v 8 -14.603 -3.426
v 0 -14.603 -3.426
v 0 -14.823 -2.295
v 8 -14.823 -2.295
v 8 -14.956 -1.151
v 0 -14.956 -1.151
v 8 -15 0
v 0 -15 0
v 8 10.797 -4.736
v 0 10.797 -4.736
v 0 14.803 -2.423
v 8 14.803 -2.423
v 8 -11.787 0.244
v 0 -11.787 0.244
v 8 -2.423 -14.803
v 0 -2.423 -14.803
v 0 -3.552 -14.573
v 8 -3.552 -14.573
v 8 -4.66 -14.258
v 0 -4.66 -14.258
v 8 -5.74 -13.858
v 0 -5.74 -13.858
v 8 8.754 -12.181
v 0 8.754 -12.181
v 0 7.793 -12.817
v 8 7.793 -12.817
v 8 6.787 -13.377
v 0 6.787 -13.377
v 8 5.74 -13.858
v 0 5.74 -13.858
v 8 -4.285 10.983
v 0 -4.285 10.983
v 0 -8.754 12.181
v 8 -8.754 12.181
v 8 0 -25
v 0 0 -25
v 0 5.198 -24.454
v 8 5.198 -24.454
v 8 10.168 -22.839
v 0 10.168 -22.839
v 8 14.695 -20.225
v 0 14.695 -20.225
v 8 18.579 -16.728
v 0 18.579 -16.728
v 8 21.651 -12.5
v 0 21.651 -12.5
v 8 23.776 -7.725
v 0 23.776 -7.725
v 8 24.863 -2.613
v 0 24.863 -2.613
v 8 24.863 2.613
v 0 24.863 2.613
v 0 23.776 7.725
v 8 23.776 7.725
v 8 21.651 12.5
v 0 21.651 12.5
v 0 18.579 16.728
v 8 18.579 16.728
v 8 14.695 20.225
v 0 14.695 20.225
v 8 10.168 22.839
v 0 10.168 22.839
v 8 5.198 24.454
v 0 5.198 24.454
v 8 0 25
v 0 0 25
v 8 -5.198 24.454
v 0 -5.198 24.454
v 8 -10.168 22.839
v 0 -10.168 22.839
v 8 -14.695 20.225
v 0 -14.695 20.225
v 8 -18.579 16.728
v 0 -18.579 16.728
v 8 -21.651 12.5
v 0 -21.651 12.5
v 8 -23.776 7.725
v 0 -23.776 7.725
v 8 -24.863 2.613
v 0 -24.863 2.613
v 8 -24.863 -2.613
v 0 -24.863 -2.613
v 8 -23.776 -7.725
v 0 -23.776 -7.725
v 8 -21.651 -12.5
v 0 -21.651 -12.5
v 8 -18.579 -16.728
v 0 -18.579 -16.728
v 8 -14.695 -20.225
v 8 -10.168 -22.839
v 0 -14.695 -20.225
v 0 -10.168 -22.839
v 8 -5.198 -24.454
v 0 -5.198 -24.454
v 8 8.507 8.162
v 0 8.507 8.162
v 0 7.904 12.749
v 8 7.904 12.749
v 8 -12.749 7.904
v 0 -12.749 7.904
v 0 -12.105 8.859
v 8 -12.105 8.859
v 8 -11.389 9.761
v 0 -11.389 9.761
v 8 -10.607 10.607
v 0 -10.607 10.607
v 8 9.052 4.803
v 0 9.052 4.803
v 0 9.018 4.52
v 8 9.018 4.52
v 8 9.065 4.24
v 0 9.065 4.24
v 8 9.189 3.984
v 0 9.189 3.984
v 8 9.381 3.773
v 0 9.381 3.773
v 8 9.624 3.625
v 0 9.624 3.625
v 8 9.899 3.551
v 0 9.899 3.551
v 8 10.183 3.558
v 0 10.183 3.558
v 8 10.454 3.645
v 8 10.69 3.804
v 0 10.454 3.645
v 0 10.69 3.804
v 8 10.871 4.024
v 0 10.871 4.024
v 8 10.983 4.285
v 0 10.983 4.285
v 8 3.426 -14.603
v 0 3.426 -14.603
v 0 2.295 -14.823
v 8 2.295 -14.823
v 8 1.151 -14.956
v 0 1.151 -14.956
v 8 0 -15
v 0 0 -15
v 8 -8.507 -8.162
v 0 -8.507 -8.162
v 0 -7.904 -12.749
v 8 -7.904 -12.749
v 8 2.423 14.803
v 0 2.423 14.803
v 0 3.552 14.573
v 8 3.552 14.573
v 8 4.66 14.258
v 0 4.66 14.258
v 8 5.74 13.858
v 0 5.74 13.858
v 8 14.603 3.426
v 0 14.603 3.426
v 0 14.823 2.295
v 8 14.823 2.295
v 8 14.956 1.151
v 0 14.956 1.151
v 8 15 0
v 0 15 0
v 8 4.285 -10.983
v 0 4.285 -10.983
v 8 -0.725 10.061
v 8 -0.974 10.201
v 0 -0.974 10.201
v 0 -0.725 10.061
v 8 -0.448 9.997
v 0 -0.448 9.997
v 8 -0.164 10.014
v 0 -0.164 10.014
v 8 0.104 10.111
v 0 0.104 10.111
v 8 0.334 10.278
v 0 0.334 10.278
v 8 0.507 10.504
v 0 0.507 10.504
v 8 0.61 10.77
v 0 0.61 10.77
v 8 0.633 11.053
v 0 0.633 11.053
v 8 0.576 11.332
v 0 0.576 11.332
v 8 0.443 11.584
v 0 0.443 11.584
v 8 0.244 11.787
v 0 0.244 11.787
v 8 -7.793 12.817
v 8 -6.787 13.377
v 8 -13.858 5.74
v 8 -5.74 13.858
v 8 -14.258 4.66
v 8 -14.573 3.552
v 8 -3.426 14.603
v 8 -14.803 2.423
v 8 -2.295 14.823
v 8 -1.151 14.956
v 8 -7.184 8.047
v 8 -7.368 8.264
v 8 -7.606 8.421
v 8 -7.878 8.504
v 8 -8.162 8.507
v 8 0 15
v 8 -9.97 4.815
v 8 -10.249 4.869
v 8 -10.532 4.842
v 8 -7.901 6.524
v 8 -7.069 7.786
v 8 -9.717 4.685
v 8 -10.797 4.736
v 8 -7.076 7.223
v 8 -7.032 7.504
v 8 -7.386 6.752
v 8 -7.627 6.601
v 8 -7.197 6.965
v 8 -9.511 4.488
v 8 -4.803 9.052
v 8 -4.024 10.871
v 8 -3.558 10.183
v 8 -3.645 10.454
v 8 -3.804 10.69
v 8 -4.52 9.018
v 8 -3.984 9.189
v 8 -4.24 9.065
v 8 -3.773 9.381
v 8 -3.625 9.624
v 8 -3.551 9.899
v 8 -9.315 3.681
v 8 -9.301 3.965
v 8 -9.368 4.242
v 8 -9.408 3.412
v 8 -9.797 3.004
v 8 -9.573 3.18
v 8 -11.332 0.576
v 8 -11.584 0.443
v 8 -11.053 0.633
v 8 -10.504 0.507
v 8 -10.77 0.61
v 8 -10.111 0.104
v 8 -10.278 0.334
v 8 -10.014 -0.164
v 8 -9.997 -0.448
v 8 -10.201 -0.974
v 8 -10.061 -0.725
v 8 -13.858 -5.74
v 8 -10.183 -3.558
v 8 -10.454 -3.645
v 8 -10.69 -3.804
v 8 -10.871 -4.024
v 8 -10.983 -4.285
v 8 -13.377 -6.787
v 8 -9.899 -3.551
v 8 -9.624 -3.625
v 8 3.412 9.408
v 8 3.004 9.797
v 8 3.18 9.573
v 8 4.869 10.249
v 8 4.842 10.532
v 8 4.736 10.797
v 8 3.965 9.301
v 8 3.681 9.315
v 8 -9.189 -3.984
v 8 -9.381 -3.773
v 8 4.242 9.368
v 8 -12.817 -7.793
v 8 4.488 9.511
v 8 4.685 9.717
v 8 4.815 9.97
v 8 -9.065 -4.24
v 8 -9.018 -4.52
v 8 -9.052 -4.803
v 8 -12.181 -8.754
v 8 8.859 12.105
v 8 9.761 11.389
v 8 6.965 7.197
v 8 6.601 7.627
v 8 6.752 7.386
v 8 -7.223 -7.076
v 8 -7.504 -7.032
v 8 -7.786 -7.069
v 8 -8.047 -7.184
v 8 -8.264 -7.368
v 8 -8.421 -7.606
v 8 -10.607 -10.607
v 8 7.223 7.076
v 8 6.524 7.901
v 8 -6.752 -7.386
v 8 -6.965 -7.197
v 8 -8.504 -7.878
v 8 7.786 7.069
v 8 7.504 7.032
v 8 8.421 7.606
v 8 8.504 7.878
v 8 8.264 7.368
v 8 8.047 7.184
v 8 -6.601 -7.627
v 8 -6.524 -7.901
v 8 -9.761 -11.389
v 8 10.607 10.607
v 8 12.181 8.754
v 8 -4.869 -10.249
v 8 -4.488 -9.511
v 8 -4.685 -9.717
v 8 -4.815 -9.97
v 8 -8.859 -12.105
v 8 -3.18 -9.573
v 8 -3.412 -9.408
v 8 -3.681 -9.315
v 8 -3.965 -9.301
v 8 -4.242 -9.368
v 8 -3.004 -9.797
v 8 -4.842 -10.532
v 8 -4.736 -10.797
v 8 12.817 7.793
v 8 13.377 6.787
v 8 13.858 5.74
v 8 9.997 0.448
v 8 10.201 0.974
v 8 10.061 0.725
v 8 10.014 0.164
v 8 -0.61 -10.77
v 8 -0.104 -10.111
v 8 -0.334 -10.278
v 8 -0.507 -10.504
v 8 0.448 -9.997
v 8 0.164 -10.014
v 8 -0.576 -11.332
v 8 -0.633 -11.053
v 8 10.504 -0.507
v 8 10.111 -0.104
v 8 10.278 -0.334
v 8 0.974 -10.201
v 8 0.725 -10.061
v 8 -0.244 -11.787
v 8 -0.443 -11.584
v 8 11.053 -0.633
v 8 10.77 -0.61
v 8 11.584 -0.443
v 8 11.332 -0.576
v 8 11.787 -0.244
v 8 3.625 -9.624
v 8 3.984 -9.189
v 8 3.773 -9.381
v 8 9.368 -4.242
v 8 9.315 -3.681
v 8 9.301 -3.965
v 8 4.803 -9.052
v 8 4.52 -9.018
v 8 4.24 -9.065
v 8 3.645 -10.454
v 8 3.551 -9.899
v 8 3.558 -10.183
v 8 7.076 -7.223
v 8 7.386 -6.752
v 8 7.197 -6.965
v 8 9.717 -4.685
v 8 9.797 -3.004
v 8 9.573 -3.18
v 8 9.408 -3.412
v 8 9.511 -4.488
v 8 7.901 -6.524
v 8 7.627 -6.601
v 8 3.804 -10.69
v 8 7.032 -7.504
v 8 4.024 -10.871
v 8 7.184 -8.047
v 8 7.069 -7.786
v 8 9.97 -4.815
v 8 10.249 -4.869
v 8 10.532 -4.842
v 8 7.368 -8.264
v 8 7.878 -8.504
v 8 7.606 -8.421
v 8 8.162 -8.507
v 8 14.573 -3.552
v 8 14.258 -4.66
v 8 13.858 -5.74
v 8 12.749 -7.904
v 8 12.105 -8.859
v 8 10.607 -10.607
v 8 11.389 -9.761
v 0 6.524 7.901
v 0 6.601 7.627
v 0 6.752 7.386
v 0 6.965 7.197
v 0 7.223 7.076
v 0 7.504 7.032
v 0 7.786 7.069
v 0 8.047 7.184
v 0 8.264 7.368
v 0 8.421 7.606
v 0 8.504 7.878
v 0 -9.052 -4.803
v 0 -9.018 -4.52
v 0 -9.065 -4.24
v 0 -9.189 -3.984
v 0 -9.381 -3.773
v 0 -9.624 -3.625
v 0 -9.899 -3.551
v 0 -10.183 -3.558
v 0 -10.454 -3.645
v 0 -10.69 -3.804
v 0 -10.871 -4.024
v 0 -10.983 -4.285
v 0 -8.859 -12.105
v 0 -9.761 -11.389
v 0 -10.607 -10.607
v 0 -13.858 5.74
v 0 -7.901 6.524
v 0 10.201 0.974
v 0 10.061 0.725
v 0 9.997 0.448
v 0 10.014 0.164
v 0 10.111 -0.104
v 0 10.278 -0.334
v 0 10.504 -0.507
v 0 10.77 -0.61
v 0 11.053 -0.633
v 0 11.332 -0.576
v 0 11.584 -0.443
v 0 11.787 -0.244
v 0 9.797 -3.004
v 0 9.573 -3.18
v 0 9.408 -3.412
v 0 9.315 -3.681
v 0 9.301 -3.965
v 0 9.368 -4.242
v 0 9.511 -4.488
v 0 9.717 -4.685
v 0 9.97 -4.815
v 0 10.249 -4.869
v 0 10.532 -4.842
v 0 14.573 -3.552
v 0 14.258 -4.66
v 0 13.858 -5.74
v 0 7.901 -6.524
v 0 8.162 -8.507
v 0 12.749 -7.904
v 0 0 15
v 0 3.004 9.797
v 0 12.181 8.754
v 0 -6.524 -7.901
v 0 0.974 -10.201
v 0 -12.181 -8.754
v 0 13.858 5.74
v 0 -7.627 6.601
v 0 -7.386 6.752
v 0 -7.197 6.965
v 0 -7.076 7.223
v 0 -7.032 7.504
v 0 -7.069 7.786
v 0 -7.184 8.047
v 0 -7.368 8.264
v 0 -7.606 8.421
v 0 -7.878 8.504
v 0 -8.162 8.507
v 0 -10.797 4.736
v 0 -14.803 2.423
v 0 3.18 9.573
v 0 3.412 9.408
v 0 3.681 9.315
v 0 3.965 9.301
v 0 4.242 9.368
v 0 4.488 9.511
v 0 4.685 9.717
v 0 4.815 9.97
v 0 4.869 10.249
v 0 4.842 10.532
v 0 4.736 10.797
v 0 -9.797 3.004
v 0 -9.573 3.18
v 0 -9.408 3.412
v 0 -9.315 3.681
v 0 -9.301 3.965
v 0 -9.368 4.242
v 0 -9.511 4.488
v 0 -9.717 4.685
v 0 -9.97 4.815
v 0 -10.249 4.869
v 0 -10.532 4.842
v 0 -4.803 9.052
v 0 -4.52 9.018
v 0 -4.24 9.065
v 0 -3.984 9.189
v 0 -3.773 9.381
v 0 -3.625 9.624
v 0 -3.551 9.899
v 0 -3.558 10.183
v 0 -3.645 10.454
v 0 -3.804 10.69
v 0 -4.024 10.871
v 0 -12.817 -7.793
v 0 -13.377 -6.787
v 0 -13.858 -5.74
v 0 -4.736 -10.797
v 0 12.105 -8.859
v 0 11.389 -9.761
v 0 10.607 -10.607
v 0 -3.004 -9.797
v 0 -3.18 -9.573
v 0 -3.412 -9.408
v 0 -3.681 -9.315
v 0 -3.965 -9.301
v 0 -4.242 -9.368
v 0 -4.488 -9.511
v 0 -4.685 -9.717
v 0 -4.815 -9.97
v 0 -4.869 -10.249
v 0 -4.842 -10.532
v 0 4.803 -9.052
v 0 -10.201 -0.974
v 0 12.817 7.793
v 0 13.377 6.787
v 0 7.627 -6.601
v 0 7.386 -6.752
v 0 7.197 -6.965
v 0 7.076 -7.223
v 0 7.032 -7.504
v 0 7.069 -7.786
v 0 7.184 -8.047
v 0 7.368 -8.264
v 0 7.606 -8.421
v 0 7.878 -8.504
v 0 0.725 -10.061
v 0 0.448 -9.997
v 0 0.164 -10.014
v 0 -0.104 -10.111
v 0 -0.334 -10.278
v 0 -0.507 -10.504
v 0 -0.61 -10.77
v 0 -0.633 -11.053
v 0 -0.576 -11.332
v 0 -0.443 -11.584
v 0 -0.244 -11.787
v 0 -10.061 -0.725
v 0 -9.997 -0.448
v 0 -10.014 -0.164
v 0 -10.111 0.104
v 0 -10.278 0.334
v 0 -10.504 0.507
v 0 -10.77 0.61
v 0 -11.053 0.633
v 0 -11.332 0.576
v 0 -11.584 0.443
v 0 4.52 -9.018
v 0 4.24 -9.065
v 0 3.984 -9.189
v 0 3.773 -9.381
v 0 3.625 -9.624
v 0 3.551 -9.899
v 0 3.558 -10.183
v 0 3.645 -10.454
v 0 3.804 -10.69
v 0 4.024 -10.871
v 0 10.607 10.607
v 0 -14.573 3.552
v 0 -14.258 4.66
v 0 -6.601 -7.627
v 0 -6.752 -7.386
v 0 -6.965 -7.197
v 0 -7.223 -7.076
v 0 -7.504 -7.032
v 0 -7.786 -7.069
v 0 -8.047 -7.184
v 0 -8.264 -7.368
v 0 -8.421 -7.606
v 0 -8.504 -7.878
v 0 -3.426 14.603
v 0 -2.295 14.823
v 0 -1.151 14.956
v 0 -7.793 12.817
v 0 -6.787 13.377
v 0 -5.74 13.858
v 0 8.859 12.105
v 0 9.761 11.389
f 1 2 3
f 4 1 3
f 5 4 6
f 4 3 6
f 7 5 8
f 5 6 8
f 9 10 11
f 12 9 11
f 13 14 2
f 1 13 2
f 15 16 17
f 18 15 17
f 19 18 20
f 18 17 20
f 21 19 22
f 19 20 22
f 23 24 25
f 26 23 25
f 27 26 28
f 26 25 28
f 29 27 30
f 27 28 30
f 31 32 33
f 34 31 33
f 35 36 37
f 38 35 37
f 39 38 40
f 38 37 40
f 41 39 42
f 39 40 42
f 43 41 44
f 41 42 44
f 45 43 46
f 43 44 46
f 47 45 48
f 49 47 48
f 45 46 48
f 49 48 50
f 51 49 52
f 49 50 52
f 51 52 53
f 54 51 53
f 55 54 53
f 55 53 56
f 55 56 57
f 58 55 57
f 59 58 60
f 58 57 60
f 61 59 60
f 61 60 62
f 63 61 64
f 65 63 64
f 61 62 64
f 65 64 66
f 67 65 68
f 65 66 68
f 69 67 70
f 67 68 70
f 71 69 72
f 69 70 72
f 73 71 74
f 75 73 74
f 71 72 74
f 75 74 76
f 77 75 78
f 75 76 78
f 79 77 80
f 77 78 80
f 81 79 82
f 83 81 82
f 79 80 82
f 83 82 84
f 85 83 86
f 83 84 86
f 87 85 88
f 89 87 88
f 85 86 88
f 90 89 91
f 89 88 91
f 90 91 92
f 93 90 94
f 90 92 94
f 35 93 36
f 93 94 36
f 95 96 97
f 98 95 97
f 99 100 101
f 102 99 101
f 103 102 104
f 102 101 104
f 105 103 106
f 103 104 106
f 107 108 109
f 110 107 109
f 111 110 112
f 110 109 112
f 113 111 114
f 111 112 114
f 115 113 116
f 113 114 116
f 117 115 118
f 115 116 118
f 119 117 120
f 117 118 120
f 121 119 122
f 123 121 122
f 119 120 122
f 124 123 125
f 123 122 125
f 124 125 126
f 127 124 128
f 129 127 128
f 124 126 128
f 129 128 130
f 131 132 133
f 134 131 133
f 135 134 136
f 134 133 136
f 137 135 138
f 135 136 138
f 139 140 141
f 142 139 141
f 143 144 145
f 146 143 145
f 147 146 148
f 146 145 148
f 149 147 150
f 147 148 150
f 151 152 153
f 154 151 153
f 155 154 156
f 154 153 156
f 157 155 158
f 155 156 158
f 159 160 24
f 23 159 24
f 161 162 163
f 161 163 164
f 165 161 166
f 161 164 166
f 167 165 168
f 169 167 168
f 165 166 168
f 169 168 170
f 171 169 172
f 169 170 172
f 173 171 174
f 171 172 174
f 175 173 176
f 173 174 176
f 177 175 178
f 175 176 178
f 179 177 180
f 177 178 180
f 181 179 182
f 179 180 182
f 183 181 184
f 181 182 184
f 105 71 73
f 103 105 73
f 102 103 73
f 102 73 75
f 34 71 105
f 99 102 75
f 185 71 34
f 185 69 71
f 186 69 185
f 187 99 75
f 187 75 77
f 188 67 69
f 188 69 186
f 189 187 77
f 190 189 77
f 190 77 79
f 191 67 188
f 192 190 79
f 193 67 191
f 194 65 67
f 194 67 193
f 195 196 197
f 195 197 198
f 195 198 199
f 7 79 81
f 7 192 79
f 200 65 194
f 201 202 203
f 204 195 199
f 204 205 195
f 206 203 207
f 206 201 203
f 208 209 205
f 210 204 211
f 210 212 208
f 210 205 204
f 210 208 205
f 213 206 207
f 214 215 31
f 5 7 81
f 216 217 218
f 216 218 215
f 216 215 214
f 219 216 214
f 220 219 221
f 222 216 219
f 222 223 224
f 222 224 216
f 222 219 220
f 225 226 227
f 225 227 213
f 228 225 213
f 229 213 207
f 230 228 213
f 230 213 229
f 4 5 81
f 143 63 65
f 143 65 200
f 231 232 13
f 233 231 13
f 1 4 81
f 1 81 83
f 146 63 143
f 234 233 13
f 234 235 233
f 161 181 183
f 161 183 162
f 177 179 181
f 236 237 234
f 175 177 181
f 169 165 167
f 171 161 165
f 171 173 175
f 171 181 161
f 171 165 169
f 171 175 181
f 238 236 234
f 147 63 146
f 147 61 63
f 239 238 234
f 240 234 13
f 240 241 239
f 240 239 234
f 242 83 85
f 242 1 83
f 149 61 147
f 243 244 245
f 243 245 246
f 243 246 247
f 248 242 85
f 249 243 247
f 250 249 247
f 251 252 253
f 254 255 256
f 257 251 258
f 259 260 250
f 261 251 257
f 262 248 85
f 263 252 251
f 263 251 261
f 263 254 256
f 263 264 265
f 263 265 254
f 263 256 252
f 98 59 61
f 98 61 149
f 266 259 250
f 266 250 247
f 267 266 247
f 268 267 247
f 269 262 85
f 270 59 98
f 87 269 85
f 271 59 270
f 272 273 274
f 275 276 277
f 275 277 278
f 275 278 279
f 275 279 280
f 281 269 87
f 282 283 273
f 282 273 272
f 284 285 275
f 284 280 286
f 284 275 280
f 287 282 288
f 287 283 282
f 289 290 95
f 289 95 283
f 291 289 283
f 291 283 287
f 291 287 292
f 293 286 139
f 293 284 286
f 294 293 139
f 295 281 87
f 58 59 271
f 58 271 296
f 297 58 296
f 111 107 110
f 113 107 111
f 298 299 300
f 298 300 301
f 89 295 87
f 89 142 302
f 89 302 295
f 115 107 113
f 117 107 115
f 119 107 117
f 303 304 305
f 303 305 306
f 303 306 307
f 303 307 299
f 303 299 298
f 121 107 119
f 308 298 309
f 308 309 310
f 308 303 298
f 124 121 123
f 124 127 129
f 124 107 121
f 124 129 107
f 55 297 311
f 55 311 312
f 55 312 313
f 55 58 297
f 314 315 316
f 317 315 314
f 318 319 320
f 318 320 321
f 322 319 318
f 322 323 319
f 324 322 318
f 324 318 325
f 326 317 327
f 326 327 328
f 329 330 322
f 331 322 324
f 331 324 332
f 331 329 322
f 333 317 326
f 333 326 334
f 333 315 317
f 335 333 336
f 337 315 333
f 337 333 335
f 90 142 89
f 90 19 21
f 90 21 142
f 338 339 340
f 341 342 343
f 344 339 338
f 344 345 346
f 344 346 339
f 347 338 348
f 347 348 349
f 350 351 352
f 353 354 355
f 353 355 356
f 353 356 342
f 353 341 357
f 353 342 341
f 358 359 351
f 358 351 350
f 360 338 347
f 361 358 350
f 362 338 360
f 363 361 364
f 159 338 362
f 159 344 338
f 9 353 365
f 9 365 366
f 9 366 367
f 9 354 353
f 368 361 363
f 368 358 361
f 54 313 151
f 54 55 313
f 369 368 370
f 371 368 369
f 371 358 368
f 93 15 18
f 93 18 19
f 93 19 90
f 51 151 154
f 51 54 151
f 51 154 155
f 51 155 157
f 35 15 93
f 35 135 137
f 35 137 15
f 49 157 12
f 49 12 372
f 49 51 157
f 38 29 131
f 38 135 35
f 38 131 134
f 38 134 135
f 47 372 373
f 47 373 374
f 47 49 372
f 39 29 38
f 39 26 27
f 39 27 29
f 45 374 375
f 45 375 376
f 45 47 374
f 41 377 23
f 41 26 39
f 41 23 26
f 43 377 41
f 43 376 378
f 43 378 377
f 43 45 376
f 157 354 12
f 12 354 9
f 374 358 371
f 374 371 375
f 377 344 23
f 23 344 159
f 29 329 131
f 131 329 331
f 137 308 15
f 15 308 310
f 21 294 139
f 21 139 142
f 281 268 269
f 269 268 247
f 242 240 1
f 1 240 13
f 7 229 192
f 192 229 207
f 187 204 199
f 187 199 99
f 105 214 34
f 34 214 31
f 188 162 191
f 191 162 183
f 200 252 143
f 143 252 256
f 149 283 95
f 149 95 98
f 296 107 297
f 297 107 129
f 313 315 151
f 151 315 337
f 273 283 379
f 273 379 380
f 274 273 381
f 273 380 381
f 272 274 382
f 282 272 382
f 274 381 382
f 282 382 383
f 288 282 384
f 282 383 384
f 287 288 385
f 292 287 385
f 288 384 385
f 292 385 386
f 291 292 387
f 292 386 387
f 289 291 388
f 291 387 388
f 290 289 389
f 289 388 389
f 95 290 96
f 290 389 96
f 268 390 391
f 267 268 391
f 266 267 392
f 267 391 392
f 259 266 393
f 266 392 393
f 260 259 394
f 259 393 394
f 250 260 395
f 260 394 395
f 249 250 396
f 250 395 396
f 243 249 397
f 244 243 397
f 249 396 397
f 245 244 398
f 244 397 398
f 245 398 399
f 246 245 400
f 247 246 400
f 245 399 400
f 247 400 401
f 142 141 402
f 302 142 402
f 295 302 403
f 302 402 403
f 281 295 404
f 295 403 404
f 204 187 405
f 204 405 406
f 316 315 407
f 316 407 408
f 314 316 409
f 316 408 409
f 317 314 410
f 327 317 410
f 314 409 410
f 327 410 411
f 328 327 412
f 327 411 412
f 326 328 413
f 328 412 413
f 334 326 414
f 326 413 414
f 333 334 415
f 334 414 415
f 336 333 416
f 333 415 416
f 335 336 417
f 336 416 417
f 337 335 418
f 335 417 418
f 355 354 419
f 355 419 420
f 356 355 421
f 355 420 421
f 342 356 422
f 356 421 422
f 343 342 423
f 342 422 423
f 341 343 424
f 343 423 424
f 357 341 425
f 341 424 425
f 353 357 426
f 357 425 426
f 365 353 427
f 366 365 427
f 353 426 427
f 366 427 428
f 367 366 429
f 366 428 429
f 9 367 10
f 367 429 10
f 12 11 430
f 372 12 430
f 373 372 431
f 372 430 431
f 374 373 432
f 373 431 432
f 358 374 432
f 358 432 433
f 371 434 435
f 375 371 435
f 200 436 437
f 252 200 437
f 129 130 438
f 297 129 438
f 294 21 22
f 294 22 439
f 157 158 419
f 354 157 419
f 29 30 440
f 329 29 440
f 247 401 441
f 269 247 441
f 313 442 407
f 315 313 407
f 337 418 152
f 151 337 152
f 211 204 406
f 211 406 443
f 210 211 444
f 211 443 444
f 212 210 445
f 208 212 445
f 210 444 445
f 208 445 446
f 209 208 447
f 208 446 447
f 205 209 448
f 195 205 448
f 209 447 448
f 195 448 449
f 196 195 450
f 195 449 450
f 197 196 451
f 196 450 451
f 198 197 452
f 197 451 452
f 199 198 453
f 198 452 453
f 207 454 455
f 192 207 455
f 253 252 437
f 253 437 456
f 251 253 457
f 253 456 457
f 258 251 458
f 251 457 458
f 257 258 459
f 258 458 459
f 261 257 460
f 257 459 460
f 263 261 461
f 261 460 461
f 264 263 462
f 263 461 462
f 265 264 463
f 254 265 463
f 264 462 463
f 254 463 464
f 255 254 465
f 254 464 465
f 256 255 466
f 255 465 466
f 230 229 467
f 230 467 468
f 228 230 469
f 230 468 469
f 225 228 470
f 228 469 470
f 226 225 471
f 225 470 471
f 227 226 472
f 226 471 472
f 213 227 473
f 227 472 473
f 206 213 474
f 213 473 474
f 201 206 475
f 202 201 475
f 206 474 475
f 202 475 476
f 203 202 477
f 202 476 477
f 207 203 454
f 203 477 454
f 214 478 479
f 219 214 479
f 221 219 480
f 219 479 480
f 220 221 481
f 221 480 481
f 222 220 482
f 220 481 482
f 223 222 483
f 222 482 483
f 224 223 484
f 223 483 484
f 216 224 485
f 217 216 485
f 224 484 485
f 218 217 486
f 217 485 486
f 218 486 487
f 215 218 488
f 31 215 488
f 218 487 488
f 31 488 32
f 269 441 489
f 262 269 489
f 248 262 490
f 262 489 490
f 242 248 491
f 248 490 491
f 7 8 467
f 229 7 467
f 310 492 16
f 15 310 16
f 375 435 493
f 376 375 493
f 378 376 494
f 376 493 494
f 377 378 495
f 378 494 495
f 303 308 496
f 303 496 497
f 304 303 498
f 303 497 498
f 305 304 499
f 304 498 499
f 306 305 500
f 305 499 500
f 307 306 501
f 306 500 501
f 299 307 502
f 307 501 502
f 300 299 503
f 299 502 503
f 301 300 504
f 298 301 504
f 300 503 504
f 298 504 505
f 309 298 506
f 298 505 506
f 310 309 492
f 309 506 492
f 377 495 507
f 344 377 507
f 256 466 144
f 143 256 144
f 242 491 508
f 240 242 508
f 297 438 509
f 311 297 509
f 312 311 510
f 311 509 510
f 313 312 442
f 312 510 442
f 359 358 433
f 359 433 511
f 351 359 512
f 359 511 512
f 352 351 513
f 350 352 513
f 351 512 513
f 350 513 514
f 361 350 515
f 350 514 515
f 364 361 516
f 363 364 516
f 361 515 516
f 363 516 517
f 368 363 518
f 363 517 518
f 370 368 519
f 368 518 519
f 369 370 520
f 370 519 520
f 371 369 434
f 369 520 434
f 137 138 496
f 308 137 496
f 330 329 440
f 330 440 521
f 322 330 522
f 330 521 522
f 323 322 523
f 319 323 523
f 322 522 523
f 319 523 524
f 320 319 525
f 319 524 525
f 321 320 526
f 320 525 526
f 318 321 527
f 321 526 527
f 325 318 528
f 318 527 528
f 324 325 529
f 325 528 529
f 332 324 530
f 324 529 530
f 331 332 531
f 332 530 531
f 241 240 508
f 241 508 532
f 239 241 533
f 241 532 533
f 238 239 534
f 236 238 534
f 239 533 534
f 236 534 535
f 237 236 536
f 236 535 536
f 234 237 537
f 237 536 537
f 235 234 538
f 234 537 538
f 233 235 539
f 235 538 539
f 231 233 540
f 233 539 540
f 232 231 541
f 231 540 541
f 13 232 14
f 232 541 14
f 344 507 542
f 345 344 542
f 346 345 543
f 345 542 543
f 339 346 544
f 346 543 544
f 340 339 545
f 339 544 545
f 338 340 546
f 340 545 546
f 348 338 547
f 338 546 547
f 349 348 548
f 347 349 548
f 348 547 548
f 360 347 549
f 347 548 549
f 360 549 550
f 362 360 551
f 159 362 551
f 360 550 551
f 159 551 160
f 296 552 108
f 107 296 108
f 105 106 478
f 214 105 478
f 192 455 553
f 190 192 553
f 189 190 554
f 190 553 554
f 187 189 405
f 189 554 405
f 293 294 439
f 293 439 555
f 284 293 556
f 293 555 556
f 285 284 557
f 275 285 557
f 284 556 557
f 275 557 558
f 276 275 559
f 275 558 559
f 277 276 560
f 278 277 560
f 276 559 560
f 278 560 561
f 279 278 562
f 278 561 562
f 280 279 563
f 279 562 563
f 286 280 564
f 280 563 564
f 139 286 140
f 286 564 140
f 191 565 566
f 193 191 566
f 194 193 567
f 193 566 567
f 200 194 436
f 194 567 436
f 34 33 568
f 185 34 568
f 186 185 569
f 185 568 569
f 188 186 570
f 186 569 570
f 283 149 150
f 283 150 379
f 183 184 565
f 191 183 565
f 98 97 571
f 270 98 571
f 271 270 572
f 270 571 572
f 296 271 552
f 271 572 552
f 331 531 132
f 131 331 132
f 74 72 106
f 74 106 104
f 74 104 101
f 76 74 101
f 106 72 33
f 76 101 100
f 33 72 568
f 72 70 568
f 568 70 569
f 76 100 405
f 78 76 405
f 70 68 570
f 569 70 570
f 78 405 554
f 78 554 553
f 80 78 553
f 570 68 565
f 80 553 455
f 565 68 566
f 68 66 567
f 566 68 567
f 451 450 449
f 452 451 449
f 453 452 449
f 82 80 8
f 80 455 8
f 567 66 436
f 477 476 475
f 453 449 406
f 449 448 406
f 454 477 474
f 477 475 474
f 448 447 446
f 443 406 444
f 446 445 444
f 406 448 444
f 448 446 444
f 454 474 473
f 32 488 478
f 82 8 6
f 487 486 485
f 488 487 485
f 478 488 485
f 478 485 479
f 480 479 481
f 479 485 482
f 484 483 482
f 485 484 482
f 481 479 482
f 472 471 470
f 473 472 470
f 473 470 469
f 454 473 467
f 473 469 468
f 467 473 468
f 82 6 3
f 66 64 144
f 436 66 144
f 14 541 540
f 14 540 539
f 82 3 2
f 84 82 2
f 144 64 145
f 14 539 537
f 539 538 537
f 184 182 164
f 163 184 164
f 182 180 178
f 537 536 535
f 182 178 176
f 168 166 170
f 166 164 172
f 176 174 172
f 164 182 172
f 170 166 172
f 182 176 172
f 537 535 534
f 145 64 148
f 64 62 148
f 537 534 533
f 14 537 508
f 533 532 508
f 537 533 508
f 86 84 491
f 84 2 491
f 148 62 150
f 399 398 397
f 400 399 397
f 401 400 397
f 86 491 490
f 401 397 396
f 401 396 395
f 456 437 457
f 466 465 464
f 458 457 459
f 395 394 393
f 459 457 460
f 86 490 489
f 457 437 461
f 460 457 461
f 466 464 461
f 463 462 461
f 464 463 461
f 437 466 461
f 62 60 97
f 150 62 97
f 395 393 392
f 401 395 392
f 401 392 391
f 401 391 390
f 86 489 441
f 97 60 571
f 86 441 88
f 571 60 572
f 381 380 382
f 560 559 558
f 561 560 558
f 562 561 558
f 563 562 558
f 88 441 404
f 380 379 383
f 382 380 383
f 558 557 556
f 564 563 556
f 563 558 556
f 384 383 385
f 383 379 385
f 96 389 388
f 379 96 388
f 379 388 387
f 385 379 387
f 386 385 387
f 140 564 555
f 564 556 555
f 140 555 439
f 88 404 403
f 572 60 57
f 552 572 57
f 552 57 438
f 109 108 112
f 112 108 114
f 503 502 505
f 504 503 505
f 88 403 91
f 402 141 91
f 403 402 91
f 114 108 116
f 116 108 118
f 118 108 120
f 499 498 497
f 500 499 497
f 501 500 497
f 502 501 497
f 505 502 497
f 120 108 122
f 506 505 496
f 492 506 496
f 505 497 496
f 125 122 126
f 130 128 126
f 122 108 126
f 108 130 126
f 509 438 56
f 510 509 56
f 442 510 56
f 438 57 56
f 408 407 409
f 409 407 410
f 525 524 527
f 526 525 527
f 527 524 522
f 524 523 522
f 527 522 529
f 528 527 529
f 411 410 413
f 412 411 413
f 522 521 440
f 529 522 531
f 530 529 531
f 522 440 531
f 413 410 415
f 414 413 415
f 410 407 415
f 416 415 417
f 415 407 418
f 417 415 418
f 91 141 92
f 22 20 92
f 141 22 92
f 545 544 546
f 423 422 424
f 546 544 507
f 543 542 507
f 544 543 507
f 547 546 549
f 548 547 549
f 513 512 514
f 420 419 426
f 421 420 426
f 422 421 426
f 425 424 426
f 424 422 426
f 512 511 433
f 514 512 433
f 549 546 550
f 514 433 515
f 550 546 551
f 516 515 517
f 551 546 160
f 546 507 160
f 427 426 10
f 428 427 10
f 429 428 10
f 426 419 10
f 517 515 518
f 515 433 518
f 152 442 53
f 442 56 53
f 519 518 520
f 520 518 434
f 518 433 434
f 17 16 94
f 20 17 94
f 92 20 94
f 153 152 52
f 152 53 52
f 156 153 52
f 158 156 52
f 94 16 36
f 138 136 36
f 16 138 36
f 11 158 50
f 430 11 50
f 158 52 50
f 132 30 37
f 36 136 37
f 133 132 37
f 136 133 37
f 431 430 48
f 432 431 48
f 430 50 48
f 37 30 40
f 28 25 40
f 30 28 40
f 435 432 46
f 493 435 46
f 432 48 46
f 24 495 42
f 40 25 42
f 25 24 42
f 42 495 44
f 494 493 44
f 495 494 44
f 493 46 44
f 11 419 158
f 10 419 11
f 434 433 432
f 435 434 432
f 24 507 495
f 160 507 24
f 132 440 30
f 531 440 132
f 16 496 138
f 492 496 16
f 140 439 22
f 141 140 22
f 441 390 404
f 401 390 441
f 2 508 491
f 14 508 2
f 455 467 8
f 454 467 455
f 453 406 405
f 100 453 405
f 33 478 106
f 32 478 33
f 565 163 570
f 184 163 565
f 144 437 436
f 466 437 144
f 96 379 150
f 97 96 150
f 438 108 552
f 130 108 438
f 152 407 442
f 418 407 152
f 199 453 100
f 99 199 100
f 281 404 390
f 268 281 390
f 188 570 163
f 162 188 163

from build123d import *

# Parameters (mm, degrees)
SKETCH1_R         = 25
MAGNET_RING_DEPTH = 8


with BuildPart() as part:
    # Sketch1 → Magnet ring (new body)
    with BuildSketch(Plane(origin=(0, 0, 0), x_dir=(0, 0, -1), z_dir=(1, 0, 0))):
        Circle(SKETCH1_R)
        with BuildLine():
            Line((0, 15), (3.004130517, 9.796693311))
            ThreePointArc((3.004130517, 9.796693311), (4.370155921, 9.430667907), (4.736181325, 10.796693311))
            Line((4.736181325, 10.796693311), (2.423147953, 14.802984631))
            ThreePointArc((2.423147953, 14.802984631), (4.10894517, 14.426245859), (5.740251485, 13.858192988))
            Line((5.740251485, 13.858192988), (6.52448692, 7.901333459))
            ThreePointArc((6.52448692, 7.901333459), (7.646457974, 7.04041479), (8.507376643, 8.162385843))
            Line((8.507376643, 8.162385843), (7.903553766, 12.748875945))
            ThreePointArc((7.903553766, 12.748875945), (9.316855624, 11.755688039), (10.606601718, 10.606601718))
            Line((10.606601718, 10.606601718), (9.051549334, 4.803067213))
            ThreePointArc((9.051549334, 4.803067213), (9.758656115, 3.578322342), (10.983400987, 4.285429123))
            Line((10.983400987, 4.285429123), (12.180715164, 8.753866465))
            ThreePointArc((12.180715164, 8.753866465), (13.106359267, 7.295433281), (13.858192988, 5.740251485))
            Line((13.858192988, 5.740251485), (10.200595414, 0.973577524))
            ThreePointArc((10.200595414, 0.973577524), (10.385187325, -0.428537245), (11.787302095, -0.243945334))
            Line((11.787302095, -0.243945334), (14.603473097, 3.42616017))
            ThreePointArc((14.603473097, 3.42616017), (14.900538521, 1.724514939), (15, 0))
            Line((15, 0), (9.796693311, -3.004130517))
            ThreePointArc((9.796693311, -3.004130517), (9.430667907, -4.370155921), (10.796693311, -4.736181325))
            Line((10.796693311, -4.736181325), (14.802984631, -2.423147953))
            ThreePointArc((14.802984631, -2.423147953), (14.426245859, -4.10894517), (13.858192988, -5.740251485))
            Line((13.858192988, -5.740251485), (7.901333459, -6.52448692))
            ThreePointArc((7.901333459, -6.52448692), (7.04041479, -7.646457974), (8.162385843, -8.507376643))
            Line((8.162385843, -8.507376643), (12.748875945, -7.903553766))
            ThreePointArc((12.748875945, -7.903553766), (11.755688039, -9.316855624), (10.606601718, -10.606601718))
            Line((10.606601718, -10.606601718), (4.803067213, -9.051549334))
            ThreePointArc((4.803067213, -9.051549334), (3.578322342, -9.758656115), (4.285429123, -10.983400987))
            Line((4.285429123, -10.983400987), (8.753866465, -12.180715164))
            ThreePointArc((8.753866465, -12.180715164), (7.295433281, -13.106359267), (5.740251485, -13.858192988))
            Line((5.740251485, -13.858192988), (0.973577524, -10.200595414))
            ThreePointArc((0.973577524, -10.200595414), (-0.428537245, -10.385187325), (-0.243945334, -11.787302095))
            Line((-0.243945334, -11.787302095), (3.42616017, -14.603473097))
            ThreePointArc((3.42616017, -14.603473097), (1.724514939, -14.900538521), (0, -15))
            Line((0, -15), (-3.004130517, -9.796693311))
            ThreePointArc((-3.004130517, -9.796693311), (-4.370155921, -9.430667907), (-4.736181325, -10.796693311))
            Line((-4.736181325, -10.796693311), (-2.423147953, -14.802984631))
            ThreePointArc((-2.423147953, -14.802984631), (-4.10894517, -14.426245859), (-5.740251485, -13.858192988))
            Line((-5.740251485, -13.858192988), (-6.52448692, -7.901333459))
            ThreePointArc((-6.52448692, -7.901333459), (-7.646457974, -7.04041479), (-8.507376643, -8.162385843))
            Line((-8.507376643, -8.162385843), (-7.903553766, -12.748875945))
            ThreePointArc((-7.903553766, -12.748875945), (-9.316855624, -11.755688039), (-10.606601718, -10.606601718))
            Line((-10.606601718, -10.606601718), (-9.051549334, -4.803067213))
            ThreePointArc((-9.051549334, -4.803067213), (-9.758656115, -3.578322342), (-10.983400987, -4.285429123))
            Line((-10.983400987, -4.285429123), (-12.180715164, -8.753866465))
            ThreePointArc((-12.180715164, -8.753866465), (-13.106359267, -7.295433281), (-13.858192988, -5.740251485))
            Line((-13.858192988, -5.740251485), (-10.200595414, -0.973577524))
            ThreePointArc((-10.200595414, -0.973577524), (-10.385187325, 0.428537245), (-11.787302095, 0.243945334))
            Line((-11.787302095, 0.243945334), (-14.603473097, -3.42616017))
            ThreePointArc((-14.603473097, -3.42616017), (-14.900538521, -1.724514939), (-15, 0))
            Line((-15, 0), (-9.796693311, 3.004130517))
            ThreePointArc((-9.796693311, 3.004130517), (-9.430667907, 4.370155921), (-10.796693311, 4.736181325))
            Line((-10.796693311, 4.736181325), (-14.802984631, 2.423147953))
            ThreePointArc((-14.802984631, 2.423147953), (-14.426245859, 4.10894517), (-13.858192988, 5.740251485))
            Line((-13.858192988, 5.740251485), (-7.901333459, 6.52448692))
            ThreePointArc((-7.901333459, 6.52448692), (-7.04041479, 7.646457974), (-8.162385843, 8.507376643))
            Line((-8.162385843, 8.507376643), (-12.748875945, 7.903553766))
            ThreePointArc((-12.748875945, 7.903553766), (-11.755688039, 9.316855624), (-10.606601718, 10.606601718))
            Line((-10.606601718, 10.606601718), (-4.803067213, 9.051549334))
            ThreePointArc((-4.803067213, 9.051549334), (-3.578322342, 9.758656115), (-4.285429123, 10.983400987))
            Line((-4.285429123, 10.983400987), (-8.753866465, 12.180715164))
            ThreePointArc((-8.753866465, 12.180715164), (-7.295433281, 13.106359267), (-5.740251485, 13.858192988))
            Line((-5.740251485, 13.858192988), (-0.973577524, 10.200595414))
            ThreePointArc((-0.973577524, 10.200595414), (0.428537245, 10.385187325), (0.243945334, 11.787302095))
            Line((0.243945334, 11.787302095), (-3.42616017, 14.603473097))
            ThreePointArc((-3.42616017, 14.603473097), (-1.724514939, 14.900538521), (0, 15))
        make_face(mode=Mode.SUBTRACT)
    extrude(amount=MAGNET_RING_DEPTH)


solid = part.part
